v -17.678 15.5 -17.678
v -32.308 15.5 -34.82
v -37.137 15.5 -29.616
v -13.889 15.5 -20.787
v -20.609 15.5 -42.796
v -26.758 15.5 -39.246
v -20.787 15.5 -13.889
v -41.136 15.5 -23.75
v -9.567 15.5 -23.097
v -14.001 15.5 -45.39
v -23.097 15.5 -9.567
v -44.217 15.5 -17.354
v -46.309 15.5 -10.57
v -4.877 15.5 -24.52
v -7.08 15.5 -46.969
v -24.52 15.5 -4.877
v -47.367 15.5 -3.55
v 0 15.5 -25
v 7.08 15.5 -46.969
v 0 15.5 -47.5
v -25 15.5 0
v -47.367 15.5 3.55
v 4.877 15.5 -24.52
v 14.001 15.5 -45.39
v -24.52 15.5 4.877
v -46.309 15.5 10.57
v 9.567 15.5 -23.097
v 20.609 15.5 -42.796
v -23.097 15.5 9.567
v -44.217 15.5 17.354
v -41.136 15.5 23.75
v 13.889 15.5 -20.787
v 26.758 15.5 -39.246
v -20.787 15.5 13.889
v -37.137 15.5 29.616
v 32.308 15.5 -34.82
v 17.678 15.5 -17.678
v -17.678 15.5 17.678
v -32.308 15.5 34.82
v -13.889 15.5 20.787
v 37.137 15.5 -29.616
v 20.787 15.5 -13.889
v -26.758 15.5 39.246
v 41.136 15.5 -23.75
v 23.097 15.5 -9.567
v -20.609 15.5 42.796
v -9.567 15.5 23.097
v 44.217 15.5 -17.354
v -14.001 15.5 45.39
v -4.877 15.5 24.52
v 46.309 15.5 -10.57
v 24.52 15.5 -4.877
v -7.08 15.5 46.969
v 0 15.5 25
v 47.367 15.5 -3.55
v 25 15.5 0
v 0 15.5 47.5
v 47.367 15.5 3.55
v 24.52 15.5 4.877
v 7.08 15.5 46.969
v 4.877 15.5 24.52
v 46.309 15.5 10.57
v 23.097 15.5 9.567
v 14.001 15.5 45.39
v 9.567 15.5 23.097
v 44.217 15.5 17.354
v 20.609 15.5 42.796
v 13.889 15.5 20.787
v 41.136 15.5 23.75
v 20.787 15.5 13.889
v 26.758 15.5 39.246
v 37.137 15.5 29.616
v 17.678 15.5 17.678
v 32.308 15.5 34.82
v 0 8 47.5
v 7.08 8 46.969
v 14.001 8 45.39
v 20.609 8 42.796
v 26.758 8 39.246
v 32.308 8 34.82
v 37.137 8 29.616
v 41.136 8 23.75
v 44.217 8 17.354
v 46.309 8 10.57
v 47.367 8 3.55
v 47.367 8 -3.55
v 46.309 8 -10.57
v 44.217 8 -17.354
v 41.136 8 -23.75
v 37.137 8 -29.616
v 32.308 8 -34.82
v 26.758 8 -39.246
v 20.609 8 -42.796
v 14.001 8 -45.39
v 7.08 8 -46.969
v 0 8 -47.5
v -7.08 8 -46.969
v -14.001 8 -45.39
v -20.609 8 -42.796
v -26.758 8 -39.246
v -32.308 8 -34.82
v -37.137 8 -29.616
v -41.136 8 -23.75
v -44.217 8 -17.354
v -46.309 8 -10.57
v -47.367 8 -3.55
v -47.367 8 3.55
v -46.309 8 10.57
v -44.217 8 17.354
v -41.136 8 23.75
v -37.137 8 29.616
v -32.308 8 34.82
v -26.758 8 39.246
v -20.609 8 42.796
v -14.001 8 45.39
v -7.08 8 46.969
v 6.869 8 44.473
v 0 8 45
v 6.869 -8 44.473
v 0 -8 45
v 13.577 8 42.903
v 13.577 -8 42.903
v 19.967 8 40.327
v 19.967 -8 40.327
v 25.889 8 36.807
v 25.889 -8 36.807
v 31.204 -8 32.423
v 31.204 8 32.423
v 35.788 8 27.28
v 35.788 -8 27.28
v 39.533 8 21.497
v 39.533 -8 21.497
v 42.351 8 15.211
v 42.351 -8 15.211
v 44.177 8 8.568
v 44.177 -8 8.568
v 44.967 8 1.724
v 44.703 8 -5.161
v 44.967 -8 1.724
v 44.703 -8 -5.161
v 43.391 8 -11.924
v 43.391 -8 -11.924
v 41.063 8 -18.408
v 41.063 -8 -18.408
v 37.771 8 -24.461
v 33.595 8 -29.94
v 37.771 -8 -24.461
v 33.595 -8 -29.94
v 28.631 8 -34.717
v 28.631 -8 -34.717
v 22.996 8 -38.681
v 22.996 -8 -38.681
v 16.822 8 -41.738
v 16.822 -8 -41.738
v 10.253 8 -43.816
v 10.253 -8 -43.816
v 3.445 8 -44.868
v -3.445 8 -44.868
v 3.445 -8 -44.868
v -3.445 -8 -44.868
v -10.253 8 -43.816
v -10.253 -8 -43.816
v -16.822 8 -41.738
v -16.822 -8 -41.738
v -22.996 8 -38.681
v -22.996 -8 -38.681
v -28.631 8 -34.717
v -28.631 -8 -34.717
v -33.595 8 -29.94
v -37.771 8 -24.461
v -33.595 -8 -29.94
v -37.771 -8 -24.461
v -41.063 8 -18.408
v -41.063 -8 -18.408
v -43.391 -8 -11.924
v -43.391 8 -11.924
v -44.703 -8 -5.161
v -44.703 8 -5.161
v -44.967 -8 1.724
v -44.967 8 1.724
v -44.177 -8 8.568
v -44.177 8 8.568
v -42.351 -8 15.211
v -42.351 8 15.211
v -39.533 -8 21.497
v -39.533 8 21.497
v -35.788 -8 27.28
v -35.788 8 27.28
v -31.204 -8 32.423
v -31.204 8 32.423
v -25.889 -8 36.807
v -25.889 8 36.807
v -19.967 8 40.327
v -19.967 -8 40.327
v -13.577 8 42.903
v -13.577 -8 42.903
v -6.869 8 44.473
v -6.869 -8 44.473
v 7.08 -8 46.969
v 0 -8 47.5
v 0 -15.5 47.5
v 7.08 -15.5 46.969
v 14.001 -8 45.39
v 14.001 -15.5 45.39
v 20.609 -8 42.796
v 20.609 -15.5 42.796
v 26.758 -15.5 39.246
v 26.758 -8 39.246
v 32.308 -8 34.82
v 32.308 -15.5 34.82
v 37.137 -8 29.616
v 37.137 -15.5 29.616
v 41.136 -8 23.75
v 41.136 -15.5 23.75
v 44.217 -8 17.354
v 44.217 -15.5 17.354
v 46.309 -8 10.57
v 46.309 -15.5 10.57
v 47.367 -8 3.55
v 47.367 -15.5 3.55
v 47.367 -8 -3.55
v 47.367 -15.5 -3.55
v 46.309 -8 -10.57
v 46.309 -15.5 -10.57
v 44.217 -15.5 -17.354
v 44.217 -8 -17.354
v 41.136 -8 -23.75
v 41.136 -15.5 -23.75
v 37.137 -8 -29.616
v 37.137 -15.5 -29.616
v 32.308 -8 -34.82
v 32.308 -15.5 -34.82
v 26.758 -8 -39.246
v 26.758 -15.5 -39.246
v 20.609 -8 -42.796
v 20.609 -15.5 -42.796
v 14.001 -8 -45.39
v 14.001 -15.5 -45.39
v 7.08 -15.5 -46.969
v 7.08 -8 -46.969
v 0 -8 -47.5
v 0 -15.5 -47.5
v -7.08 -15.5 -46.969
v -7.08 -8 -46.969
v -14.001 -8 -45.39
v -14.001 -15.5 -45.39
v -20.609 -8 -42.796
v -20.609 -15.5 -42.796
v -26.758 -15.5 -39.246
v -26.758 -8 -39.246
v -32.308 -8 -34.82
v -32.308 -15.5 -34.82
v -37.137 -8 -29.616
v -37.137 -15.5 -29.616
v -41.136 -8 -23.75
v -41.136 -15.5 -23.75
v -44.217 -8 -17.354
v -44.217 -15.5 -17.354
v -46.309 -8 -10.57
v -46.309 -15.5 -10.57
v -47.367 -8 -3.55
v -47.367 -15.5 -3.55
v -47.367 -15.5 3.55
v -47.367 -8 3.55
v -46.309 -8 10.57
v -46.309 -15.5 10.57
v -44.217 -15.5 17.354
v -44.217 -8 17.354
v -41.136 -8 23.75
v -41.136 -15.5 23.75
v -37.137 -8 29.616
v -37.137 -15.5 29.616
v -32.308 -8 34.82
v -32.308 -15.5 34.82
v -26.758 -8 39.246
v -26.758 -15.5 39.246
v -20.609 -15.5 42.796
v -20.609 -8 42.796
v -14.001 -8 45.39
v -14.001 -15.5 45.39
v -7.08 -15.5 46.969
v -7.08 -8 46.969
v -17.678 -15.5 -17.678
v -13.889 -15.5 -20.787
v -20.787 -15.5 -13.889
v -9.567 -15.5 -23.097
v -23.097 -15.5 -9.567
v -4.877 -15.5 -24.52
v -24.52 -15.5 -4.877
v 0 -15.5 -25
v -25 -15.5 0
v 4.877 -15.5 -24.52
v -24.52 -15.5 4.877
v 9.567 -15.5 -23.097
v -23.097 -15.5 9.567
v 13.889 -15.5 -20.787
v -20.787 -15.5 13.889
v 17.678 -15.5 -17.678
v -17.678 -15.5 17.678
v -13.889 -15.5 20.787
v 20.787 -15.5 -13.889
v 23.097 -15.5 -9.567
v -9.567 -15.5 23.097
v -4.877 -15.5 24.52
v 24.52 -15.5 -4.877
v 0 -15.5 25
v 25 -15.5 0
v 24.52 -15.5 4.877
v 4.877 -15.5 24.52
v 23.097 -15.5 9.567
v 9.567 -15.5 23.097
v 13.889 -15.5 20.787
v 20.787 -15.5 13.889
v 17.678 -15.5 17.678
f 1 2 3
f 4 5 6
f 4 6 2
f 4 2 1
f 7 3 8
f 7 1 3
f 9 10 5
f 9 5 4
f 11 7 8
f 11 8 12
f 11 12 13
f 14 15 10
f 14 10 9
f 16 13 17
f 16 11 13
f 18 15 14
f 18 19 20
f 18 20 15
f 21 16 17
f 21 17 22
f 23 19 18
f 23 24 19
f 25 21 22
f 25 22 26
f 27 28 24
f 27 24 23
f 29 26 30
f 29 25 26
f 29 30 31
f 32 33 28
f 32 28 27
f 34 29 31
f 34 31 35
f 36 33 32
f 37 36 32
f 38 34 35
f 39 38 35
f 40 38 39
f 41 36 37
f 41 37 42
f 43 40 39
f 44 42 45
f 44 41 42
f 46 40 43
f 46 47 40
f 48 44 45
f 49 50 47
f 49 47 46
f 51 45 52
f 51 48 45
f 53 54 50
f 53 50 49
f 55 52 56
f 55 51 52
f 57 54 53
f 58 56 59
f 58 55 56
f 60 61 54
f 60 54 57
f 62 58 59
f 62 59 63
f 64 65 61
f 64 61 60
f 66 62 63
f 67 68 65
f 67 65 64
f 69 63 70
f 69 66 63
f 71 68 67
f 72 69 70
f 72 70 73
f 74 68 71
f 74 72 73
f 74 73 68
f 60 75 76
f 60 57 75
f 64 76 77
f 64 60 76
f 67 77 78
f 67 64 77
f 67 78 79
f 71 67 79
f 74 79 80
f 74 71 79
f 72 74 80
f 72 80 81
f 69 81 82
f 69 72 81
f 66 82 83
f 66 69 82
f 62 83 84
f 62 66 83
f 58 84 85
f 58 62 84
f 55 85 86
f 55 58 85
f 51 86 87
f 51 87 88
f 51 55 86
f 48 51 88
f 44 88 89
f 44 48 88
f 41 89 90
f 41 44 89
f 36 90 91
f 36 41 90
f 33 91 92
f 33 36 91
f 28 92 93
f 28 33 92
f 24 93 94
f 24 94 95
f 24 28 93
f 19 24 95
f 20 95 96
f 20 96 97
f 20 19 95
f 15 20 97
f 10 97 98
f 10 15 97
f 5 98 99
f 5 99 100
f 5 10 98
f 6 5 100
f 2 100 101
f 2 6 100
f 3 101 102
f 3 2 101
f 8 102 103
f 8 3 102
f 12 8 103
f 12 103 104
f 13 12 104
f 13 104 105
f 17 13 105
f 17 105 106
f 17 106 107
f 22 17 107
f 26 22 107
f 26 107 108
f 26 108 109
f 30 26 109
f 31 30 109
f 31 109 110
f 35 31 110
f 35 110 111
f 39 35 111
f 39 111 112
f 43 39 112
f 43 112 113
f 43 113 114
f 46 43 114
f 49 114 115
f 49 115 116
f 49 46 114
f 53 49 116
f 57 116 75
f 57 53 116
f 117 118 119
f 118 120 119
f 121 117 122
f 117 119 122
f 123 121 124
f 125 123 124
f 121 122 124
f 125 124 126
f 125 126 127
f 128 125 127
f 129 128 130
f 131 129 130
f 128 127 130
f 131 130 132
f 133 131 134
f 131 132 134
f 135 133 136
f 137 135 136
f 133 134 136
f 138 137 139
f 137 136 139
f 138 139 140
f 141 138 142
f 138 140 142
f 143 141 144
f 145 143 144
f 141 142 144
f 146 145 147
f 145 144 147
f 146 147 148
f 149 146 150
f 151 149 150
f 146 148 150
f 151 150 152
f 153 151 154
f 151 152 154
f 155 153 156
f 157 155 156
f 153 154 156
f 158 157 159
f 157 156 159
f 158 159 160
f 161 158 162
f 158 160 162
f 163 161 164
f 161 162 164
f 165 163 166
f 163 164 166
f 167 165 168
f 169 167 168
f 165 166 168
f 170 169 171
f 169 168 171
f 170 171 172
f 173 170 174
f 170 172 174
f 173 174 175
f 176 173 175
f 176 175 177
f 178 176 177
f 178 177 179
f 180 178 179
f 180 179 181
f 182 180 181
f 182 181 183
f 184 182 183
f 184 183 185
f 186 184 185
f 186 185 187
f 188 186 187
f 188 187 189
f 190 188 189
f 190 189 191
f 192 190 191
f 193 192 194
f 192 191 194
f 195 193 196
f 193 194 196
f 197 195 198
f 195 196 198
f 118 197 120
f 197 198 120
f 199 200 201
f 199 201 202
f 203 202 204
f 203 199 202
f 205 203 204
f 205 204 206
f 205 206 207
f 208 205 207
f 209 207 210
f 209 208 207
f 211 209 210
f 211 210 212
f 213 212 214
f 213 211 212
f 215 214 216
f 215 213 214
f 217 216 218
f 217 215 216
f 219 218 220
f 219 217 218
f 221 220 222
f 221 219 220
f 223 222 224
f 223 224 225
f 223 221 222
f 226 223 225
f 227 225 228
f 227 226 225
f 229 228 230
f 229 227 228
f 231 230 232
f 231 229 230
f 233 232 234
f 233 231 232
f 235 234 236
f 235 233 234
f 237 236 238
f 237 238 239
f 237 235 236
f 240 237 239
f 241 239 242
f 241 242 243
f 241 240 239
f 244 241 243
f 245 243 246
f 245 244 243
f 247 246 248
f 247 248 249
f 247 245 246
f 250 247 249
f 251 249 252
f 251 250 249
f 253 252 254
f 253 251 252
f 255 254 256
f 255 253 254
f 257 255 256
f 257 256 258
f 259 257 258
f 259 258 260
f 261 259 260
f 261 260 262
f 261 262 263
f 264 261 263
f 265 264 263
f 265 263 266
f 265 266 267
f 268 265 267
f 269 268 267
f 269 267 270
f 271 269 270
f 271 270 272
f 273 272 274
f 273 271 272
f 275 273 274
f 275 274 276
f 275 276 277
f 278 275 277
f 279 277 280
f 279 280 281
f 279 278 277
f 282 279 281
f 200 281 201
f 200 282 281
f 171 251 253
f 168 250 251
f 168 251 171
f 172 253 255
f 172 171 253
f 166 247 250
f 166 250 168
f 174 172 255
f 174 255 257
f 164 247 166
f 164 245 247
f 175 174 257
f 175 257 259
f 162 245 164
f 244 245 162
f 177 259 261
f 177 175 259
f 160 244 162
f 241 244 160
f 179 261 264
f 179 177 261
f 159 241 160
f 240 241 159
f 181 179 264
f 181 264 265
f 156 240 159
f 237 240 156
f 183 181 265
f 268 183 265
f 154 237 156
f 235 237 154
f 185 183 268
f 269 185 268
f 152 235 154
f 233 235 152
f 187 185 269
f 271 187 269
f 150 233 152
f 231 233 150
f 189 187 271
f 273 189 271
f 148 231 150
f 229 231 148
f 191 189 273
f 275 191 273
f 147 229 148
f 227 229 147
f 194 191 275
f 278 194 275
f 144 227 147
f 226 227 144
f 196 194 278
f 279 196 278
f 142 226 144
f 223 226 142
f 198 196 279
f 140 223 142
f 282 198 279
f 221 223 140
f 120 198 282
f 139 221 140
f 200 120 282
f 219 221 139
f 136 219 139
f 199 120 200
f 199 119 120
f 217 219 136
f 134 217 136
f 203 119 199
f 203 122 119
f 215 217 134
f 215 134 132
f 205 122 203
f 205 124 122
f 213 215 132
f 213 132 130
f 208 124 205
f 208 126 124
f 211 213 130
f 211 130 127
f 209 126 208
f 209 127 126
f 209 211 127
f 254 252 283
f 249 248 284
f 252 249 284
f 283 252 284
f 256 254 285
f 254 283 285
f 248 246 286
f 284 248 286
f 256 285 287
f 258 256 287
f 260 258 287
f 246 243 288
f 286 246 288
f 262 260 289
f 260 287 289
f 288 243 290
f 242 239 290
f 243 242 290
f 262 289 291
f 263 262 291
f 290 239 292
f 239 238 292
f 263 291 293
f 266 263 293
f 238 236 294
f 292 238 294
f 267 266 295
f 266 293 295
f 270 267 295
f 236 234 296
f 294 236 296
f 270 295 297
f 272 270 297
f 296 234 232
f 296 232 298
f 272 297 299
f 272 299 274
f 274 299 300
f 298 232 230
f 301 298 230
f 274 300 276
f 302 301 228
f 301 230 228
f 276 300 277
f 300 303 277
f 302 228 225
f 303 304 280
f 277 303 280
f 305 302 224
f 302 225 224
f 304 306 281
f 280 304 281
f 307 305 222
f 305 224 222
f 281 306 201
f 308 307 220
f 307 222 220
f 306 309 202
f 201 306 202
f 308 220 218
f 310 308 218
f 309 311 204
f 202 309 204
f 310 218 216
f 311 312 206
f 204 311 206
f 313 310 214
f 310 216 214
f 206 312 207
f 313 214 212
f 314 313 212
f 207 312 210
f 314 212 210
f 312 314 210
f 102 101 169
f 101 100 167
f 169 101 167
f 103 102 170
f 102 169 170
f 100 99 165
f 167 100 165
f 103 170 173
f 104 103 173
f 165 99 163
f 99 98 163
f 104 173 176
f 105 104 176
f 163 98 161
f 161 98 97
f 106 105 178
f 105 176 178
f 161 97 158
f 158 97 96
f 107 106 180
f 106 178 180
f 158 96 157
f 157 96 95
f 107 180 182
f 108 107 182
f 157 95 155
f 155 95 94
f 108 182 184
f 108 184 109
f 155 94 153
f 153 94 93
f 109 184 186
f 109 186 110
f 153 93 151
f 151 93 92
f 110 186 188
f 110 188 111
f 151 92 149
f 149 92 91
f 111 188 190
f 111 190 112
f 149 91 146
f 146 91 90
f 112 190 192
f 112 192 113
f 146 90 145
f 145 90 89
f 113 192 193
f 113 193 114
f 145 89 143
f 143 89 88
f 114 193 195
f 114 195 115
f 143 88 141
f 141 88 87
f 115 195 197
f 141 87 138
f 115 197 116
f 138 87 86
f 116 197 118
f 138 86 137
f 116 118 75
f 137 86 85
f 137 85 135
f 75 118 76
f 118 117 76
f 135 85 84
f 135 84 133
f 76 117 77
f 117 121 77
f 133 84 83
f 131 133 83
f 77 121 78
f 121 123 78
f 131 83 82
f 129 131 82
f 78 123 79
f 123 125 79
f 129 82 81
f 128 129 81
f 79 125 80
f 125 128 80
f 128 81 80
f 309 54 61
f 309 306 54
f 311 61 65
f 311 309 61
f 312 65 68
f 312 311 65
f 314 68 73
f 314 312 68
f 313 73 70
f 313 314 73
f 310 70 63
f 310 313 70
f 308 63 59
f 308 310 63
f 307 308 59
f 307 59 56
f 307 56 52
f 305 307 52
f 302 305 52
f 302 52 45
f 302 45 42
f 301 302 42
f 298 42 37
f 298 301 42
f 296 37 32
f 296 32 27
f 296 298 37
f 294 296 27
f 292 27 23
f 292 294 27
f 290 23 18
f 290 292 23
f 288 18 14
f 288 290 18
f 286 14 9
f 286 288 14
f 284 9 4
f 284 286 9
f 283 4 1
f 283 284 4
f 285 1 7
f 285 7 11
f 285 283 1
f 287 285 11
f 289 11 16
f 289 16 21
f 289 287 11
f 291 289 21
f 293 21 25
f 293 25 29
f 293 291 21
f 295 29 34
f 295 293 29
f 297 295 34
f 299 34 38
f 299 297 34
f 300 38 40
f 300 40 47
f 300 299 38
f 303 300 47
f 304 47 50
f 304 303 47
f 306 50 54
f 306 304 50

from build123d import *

# Parameters (mm, degrees)
SKETCH1_R           = 47.5
SKETCH1_R_2         = 25
BOSS_EXTRUDE1_DEPTH = 15.5
SKETCH3_R           = 47.5
SKETCH3_R_2         = 45
CUT_EXTRUDE1_DEPTH  = 8


with BuildPart() as part:
    # Sketch1 → Boss-Extrude1 (new, symmetric)
    with BuildSketch(Plane(origin=(0, 0, 0), x_dir=(1, 0, 0), z_dir=(0, 1, 0))):
        with Locations(Location((0, 0, 0), (0, 0, 270))):
            Circle(SKETCH1_R)
        with Locations(Location((0, 0, 0), (0, 0, 270))):
            Circle(SKETCH1_R_2, mode=Mode.SUBTRACT)
    extrude(amount=BOSS_EXTRUDE1_DEPTH, both=True)

    # Sketch3 → Cut-Extrude1 (cut, symmetric)
    with BuildSketch(Plane(origin=(0, 0, 0), x_dir=(1, 0, 0), z_dir=(0, 1, 0))):
        with Locations(Location((0, 0, 0), (0, 0, 270))):
            Circle(SKETCH3_R)
        with Locations(Location((0, 0, 0), (0, 0, 270))):
            Circle(SKETCH3_R_2, mode=Mode.SUBTRACT)
    extrude(amount=CUT_EXTRUDE1_DEPTH, both=True, mode=Mode.SUBTRACT)


solid = part.part
